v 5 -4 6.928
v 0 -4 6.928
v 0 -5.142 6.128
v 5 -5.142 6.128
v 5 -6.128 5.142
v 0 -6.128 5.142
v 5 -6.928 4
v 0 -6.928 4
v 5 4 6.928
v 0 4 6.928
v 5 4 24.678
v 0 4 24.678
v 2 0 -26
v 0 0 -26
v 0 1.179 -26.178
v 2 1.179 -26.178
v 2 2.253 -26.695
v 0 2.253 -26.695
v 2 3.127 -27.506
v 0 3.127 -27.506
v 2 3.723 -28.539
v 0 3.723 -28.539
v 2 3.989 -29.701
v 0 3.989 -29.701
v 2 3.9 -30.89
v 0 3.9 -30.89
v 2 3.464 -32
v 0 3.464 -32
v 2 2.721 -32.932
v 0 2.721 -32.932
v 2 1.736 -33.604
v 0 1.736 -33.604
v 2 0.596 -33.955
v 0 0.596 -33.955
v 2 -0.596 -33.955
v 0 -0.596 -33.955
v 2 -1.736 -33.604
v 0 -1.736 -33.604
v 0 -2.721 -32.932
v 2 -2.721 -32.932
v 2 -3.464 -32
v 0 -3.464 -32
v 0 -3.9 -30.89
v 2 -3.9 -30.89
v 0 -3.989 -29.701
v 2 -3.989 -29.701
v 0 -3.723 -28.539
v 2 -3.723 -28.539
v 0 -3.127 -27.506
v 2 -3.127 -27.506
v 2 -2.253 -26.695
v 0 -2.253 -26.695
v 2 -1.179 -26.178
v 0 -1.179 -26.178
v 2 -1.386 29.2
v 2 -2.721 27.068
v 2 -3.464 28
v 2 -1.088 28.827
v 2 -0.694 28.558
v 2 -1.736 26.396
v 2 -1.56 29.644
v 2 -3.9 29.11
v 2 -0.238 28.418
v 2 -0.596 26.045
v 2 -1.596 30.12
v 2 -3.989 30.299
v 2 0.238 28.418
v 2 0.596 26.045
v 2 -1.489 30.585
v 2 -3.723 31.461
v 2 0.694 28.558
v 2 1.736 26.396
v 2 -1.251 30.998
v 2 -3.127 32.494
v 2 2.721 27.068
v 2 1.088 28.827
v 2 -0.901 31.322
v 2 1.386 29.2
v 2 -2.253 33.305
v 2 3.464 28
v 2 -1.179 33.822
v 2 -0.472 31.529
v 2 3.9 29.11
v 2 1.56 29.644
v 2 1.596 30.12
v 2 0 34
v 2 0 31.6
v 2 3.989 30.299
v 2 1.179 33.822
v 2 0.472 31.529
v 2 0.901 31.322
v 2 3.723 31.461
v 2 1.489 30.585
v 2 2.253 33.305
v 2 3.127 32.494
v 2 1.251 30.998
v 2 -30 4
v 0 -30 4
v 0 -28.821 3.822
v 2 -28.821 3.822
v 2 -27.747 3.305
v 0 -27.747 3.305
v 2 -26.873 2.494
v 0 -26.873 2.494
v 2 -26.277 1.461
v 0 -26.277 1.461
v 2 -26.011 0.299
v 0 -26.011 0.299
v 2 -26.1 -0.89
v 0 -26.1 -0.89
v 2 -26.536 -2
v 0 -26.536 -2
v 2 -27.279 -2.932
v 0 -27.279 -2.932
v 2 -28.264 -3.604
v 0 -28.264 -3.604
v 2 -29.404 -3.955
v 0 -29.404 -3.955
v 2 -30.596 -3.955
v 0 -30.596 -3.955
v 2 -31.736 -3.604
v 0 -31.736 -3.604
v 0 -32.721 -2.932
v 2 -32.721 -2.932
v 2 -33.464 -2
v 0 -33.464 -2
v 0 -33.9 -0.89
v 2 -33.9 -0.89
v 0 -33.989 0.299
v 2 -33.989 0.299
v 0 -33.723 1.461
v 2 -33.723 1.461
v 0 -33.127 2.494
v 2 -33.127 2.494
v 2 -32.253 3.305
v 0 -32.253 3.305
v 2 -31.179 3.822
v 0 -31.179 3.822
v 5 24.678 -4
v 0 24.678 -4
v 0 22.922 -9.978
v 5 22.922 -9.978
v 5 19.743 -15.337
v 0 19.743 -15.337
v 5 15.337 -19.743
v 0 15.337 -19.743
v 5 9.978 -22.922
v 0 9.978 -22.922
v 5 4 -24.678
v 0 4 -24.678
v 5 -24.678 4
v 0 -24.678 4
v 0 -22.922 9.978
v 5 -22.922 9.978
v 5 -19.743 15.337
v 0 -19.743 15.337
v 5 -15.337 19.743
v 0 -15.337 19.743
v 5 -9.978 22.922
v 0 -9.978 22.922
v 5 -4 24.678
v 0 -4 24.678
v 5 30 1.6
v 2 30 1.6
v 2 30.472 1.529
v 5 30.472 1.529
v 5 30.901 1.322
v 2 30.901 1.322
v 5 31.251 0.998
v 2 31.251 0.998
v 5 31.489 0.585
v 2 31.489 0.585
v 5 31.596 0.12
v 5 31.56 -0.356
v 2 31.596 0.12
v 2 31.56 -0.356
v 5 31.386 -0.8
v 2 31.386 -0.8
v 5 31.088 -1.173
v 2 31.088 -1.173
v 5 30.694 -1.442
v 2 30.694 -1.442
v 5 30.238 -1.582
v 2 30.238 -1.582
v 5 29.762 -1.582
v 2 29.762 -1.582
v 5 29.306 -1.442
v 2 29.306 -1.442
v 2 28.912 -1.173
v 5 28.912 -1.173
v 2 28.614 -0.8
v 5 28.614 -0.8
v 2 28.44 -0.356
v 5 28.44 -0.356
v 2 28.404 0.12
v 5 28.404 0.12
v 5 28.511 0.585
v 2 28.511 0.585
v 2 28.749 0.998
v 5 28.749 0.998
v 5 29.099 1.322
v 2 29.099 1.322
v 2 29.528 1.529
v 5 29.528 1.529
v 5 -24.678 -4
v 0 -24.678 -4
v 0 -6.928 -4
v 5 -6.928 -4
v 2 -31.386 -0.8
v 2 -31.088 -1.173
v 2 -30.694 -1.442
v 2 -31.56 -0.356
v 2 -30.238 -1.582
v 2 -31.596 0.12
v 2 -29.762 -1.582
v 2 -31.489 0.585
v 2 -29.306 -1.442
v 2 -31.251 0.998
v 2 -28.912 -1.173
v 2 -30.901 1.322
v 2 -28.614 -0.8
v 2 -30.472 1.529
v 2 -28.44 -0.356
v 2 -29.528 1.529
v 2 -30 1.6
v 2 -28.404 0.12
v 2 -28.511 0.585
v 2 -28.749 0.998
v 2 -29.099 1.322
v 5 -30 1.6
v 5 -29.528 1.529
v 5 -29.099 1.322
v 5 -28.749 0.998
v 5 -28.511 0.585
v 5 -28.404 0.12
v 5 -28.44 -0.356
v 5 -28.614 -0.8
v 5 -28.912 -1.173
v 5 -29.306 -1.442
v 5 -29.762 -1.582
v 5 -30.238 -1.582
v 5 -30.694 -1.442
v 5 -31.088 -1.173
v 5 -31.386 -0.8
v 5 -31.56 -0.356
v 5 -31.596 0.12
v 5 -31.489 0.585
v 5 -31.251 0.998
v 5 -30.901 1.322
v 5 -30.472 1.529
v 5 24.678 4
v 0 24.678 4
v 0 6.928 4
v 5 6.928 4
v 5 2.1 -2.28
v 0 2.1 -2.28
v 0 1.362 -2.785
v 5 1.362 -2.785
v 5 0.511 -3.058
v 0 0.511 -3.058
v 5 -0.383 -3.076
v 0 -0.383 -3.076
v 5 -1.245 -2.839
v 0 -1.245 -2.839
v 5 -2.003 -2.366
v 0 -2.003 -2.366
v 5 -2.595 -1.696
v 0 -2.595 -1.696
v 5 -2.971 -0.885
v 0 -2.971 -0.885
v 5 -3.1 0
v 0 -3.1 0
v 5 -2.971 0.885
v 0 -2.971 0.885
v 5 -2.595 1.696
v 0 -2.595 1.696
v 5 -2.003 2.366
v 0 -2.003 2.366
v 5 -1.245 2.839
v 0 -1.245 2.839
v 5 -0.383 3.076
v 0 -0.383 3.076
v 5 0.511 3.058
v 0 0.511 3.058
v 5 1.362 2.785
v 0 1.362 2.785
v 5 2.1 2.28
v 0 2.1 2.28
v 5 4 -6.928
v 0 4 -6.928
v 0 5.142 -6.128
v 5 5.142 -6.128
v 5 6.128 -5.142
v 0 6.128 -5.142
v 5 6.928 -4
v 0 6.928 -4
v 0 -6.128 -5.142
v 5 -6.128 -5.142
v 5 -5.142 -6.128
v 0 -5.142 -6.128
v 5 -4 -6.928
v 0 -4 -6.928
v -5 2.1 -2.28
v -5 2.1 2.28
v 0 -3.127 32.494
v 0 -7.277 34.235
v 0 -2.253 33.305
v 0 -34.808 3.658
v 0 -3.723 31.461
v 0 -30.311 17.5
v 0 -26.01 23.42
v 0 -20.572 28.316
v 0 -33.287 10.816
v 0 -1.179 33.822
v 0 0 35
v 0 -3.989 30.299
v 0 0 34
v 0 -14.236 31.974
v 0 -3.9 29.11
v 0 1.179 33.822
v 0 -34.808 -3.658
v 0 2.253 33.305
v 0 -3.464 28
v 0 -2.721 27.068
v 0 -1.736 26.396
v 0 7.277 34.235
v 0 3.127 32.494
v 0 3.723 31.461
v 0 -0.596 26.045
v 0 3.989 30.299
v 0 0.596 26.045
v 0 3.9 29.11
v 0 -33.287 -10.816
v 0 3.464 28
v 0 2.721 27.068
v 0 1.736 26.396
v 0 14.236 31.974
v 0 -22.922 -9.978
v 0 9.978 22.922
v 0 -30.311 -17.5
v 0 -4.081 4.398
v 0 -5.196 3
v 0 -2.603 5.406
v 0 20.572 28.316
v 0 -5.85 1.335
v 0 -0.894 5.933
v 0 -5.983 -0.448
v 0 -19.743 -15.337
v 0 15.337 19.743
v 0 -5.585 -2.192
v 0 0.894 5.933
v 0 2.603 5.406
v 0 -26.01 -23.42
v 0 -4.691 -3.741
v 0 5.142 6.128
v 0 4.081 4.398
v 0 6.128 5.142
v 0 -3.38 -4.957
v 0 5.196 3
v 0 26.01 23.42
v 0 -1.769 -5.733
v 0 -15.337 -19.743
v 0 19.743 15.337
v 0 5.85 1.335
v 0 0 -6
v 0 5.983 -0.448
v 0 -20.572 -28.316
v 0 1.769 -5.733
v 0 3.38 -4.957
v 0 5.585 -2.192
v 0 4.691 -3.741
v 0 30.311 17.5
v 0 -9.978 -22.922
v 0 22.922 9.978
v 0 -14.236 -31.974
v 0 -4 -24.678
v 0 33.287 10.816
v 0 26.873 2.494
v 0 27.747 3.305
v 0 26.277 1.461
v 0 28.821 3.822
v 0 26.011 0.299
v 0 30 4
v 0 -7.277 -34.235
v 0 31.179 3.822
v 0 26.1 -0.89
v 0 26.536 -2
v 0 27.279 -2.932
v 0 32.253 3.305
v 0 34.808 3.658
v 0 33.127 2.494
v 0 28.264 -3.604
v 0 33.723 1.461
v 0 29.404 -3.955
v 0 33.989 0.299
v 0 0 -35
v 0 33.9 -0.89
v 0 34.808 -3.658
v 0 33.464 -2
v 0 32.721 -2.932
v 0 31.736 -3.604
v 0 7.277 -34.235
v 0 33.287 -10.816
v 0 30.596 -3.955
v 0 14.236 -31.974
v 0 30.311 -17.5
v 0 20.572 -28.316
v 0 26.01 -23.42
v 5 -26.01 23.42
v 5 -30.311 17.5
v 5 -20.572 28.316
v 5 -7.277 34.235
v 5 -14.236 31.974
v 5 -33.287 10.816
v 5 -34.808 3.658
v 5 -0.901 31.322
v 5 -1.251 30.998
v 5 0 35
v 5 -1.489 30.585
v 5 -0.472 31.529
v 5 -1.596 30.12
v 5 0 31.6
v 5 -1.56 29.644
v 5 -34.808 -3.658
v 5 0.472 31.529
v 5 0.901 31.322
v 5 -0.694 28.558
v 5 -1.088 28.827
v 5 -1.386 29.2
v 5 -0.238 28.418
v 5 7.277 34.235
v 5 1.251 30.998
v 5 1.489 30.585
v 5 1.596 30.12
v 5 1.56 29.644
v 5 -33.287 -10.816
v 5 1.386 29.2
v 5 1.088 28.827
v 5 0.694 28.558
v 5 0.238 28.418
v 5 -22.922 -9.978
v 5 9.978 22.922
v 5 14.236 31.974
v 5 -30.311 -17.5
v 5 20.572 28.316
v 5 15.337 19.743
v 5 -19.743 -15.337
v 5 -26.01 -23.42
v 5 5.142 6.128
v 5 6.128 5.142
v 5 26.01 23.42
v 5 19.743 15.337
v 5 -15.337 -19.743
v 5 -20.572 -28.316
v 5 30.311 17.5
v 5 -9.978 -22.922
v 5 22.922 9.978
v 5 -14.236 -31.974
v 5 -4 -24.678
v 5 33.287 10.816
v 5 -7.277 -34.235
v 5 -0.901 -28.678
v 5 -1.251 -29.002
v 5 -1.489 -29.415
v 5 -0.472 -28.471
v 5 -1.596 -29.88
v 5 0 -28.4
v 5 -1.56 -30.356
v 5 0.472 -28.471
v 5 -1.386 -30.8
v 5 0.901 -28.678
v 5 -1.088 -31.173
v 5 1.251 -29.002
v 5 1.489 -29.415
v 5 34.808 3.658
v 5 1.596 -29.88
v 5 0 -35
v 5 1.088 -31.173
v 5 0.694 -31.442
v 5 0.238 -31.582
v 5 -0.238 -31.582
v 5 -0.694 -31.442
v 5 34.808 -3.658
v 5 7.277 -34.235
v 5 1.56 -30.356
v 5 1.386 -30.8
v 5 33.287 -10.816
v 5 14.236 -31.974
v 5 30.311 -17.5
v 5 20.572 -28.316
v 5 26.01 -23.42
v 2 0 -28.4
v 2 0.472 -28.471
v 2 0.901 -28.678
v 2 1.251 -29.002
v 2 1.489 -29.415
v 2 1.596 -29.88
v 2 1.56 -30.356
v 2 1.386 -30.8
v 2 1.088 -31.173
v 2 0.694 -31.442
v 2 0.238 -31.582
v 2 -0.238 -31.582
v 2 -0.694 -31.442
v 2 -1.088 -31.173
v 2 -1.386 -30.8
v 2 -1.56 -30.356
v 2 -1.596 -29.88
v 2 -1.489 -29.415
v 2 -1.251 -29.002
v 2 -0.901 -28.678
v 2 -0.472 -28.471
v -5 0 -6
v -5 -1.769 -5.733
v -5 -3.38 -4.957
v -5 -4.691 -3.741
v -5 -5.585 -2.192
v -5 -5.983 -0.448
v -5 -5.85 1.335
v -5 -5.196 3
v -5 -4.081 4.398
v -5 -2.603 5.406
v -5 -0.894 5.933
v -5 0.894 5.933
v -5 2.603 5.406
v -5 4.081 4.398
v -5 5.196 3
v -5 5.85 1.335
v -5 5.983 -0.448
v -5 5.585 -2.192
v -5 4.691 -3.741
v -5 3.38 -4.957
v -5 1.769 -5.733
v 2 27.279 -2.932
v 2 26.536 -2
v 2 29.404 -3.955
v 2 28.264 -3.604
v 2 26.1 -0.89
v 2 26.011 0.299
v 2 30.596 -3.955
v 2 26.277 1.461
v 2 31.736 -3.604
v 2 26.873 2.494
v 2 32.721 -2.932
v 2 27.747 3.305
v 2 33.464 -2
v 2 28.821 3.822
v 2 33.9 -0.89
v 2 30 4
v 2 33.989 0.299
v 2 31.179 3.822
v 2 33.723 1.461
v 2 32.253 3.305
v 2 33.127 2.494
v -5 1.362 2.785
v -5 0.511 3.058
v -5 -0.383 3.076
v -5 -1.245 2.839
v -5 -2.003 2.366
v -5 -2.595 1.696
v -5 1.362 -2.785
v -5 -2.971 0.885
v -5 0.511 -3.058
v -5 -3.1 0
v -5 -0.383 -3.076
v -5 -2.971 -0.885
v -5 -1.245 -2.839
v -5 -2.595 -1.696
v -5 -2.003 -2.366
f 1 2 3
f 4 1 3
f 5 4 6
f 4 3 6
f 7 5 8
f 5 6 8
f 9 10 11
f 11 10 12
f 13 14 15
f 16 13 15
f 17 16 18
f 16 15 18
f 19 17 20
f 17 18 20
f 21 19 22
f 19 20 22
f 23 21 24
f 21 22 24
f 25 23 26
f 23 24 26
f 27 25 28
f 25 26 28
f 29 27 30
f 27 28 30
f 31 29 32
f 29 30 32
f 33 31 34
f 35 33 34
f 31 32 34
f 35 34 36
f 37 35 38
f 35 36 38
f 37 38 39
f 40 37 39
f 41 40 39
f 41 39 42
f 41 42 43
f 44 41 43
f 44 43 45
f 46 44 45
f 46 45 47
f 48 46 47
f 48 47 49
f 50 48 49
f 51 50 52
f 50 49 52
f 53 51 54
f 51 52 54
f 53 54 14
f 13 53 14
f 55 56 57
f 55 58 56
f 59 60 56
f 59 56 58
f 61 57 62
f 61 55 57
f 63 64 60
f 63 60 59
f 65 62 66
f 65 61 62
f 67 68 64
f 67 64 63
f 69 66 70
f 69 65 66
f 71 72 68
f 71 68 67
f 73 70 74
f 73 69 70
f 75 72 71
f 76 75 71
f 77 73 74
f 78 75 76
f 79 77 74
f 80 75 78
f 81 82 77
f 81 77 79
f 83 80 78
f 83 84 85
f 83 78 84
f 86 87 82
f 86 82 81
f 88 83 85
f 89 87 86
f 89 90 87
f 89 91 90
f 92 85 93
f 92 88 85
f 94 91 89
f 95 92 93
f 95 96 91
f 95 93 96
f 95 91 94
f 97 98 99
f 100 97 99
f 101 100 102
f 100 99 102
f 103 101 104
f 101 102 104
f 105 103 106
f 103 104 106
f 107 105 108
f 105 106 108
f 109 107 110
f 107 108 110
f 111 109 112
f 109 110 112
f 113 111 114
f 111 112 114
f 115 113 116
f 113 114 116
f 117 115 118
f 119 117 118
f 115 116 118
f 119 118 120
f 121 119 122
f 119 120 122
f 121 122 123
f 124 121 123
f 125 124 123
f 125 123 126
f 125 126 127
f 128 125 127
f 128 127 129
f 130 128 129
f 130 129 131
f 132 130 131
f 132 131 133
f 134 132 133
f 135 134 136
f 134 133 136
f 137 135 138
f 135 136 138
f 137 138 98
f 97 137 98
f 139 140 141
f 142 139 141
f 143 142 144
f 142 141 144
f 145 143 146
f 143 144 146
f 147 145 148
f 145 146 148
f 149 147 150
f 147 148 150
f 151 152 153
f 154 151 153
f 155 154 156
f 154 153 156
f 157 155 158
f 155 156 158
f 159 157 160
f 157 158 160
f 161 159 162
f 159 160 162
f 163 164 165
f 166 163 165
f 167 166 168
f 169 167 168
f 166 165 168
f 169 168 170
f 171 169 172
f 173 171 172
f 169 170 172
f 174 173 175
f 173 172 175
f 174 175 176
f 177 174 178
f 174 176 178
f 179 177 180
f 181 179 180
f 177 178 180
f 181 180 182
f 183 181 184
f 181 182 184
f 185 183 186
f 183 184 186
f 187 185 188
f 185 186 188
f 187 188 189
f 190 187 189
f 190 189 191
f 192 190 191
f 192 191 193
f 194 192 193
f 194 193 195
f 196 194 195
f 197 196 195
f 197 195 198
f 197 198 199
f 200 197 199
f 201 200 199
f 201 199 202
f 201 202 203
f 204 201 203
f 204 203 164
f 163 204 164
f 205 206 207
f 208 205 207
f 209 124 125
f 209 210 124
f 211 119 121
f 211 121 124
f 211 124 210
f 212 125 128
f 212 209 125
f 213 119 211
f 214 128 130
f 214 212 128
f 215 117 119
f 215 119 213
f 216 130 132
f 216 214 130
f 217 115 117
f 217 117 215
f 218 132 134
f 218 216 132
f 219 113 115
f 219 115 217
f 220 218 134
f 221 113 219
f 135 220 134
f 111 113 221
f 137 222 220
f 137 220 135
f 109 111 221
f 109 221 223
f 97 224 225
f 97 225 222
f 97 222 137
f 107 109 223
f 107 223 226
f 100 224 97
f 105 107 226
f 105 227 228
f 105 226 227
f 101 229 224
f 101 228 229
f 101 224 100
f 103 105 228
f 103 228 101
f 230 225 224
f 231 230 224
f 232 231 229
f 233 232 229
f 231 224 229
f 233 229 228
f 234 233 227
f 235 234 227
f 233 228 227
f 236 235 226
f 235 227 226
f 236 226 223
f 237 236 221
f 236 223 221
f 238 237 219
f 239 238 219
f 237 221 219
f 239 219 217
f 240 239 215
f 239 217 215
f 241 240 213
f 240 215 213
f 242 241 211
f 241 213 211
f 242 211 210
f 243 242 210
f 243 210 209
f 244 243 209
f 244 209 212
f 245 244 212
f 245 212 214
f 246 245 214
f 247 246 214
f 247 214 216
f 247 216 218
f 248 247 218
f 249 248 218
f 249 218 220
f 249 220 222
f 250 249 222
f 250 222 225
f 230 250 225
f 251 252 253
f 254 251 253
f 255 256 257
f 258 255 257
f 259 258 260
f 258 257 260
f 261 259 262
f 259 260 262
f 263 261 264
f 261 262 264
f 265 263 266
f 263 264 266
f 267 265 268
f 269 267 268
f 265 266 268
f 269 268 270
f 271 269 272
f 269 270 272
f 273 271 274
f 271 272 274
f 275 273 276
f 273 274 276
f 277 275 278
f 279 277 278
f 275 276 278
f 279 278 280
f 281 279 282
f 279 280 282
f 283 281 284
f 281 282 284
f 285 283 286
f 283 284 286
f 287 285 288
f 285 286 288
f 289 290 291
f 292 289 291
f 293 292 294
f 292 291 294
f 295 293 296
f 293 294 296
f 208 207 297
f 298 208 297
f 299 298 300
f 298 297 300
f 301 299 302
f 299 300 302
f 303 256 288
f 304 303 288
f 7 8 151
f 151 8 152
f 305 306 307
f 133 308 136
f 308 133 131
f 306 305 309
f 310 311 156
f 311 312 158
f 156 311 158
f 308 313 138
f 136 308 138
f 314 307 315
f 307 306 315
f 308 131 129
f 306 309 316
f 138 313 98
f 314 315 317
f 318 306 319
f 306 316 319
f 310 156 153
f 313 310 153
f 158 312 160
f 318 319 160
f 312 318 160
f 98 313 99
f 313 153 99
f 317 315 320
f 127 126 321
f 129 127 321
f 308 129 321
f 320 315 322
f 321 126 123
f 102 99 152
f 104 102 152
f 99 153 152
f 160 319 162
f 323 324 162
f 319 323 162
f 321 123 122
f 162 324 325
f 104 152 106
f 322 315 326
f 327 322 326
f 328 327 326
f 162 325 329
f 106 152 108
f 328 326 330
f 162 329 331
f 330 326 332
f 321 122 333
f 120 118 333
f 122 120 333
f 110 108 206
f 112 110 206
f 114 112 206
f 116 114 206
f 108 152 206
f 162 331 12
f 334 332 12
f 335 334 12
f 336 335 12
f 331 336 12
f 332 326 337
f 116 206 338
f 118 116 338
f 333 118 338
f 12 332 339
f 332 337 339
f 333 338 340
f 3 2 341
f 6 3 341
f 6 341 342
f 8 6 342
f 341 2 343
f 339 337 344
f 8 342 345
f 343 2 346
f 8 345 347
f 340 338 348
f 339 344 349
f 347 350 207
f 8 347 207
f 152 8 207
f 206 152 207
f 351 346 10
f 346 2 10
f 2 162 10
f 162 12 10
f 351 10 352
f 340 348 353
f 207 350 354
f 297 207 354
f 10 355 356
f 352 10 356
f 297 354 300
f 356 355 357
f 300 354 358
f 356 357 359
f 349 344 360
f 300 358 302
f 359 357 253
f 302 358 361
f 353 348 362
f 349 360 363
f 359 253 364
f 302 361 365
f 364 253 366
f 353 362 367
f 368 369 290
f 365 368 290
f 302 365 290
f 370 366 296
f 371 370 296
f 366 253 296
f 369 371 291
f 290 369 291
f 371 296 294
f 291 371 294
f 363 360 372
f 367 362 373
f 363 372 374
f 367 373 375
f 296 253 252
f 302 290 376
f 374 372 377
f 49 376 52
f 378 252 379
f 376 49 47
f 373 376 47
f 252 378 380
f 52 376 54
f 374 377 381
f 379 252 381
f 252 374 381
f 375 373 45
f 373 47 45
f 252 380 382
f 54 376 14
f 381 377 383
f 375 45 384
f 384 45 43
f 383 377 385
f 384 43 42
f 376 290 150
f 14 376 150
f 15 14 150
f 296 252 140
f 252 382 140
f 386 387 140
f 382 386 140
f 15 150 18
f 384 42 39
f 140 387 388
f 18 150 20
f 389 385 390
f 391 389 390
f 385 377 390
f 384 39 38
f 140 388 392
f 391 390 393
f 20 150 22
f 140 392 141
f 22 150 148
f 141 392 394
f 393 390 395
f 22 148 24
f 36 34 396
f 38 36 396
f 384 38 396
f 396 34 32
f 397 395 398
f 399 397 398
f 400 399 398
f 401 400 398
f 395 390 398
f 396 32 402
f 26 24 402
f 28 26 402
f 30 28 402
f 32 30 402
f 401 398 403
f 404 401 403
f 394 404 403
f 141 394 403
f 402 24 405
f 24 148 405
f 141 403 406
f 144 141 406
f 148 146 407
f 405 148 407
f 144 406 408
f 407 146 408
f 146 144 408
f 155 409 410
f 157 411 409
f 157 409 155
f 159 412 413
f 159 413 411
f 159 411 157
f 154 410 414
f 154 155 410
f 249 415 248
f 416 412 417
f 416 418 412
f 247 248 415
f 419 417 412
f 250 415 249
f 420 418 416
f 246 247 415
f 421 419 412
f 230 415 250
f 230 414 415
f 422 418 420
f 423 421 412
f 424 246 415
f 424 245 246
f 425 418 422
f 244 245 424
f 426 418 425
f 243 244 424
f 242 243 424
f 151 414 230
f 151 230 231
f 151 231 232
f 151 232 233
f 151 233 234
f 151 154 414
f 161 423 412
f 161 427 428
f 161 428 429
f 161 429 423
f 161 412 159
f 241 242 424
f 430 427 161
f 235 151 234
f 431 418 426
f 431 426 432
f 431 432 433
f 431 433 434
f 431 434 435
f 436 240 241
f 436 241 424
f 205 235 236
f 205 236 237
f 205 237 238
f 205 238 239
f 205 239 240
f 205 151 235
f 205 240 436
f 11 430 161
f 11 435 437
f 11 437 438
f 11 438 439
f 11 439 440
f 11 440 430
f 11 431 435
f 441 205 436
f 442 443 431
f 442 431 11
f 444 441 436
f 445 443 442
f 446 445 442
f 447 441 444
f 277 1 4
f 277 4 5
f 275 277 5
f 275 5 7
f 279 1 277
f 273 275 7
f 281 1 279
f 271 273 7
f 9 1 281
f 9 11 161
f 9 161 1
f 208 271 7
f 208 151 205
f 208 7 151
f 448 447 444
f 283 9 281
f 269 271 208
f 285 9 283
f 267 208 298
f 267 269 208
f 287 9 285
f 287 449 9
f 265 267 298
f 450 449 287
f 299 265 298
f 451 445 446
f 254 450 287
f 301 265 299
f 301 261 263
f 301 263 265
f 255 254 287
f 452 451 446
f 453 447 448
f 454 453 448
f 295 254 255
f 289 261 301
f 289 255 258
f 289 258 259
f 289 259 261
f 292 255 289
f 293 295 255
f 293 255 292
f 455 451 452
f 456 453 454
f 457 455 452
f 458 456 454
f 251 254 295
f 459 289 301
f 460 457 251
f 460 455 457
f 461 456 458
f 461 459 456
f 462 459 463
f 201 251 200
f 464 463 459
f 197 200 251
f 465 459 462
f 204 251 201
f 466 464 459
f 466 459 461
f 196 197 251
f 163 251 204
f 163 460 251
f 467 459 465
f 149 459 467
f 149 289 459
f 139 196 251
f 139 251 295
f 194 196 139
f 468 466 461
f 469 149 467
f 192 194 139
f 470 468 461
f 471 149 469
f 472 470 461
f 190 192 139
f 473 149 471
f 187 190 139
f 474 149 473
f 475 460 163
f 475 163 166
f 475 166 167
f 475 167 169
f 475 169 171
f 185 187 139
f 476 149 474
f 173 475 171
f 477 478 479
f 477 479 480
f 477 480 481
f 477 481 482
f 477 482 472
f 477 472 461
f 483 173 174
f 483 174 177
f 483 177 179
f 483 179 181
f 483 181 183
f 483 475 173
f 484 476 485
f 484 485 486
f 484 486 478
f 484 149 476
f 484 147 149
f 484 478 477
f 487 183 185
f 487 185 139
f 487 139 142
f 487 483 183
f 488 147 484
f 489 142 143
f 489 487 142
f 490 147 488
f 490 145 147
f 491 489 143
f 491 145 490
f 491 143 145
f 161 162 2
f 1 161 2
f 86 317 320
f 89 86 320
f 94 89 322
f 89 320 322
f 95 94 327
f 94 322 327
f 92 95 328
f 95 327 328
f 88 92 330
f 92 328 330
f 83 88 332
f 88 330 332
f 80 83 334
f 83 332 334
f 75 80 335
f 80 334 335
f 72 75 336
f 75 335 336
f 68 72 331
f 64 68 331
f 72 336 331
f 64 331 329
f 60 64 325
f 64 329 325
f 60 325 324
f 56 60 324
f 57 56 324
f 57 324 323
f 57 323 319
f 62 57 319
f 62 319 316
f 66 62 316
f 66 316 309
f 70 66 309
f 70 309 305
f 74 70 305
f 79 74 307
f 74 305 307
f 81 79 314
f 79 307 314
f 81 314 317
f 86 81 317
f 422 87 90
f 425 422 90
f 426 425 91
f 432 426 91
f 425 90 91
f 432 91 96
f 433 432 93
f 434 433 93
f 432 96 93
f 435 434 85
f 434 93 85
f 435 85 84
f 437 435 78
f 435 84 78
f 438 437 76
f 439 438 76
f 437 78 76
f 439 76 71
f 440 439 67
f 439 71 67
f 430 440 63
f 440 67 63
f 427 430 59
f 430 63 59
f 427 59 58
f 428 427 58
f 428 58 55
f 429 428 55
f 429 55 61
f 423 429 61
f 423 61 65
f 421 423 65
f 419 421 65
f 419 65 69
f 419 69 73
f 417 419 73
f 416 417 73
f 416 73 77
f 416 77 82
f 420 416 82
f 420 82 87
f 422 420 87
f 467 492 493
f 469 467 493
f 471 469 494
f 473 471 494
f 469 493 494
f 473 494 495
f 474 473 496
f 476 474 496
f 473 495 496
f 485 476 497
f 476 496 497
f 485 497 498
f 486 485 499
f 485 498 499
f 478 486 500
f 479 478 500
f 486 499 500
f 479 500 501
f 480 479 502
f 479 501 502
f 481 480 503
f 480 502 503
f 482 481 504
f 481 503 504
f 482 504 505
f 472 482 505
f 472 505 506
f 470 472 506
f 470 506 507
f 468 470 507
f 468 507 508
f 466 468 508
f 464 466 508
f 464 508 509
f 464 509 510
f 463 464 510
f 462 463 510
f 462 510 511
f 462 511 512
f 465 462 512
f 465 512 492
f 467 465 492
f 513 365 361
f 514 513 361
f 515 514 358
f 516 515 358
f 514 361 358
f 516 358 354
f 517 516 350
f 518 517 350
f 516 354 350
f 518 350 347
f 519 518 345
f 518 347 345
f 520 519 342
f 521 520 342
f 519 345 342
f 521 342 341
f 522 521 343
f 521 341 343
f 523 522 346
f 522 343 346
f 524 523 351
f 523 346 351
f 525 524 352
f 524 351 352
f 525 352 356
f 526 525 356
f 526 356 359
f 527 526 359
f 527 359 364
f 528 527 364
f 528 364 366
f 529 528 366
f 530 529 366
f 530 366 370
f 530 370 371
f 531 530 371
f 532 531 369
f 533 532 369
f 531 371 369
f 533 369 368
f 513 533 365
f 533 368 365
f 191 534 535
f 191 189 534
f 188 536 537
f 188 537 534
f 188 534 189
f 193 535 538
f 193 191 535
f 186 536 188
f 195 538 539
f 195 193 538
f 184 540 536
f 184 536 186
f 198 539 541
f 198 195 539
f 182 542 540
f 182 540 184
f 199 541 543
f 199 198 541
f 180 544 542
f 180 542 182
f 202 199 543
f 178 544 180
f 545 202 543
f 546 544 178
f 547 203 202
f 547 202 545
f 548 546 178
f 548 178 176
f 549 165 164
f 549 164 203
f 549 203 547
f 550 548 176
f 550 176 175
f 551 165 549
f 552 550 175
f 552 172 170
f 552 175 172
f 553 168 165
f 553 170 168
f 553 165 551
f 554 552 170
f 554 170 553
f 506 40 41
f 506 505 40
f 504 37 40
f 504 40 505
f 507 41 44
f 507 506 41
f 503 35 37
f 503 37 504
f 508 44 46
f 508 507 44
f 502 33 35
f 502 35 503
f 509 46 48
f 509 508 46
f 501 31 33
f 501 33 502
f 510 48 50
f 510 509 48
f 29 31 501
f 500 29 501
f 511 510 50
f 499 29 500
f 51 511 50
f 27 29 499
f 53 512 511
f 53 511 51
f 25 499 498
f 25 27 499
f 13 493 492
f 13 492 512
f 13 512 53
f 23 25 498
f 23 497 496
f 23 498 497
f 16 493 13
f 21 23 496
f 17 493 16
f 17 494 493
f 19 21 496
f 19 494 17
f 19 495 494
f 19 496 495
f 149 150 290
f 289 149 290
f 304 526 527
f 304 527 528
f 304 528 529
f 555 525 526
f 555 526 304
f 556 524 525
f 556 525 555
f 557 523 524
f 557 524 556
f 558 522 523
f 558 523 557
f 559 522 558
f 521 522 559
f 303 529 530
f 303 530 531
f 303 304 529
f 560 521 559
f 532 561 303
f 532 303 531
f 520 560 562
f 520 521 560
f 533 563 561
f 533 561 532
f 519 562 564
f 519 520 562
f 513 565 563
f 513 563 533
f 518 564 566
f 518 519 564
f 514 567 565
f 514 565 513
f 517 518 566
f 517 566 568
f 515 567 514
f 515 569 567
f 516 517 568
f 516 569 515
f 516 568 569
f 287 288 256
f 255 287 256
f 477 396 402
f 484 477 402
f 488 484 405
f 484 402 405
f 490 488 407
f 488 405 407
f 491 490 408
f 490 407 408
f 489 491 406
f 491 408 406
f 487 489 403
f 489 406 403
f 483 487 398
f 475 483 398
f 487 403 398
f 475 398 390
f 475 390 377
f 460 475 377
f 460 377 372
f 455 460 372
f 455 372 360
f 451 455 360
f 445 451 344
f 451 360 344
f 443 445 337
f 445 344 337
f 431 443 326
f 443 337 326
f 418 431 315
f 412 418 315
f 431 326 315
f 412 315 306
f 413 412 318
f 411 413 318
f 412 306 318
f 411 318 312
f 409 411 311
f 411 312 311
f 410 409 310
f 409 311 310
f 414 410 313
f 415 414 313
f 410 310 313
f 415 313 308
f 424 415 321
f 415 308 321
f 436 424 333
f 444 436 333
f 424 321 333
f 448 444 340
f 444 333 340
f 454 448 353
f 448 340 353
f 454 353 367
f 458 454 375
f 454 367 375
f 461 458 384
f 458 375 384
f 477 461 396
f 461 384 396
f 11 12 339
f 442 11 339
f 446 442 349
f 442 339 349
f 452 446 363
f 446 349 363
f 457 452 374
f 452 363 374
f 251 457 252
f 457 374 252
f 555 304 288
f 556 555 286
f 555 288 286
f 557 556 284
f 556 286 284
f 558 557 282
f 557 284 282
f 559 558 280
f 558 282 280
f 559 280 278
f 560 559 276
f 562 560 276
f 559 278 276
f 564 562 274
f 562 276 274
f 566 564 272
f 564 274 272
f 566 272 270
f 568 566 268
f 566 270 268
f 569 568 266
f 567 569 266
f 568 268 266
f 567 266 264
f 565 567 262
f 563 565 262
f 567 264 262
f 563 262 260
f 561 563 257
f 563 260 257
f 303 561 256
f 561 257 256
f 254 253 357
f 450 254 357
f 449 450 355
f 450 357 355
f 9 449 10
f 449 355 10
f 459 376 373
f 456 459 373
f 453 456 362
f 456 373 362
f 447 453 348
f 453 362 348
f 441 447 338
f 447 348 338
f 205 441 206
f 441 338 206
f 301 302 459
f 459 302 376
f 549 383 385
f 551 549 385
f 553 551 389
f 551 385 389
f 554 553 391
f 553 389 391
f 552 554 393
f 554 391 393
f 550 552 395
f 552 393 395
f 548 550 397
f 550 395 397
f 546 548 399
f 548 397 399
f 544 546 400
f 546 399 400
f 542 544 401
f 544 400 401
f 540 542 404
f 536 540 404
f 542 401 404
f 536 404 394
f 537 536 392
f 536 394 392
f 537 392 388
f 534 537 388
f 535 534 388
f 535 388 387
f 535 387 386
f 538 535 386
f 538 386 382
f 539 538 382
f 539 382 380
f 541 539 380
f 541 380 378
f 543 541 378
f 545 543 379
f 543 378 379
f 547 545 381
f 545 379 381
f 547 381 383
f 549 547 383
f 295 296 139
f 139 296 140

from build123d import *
from build123d.topology import SkipClean

# Parameters (mm, degrees)
SKETCH1_R           = 35
BOSS_EXTRUDE1_DEPTH = 5
SKETCH2_R           = 1.6
CUT_EXTRUDE1_DEPTH  = 50.749371855
SKETCH3_R           = 6
BOSS_EXTRUDE2_DEPTH = 5
SKETCH6_R           = 4
CUT_EXTRUDE2_DEPTH  = 2


with BuildPart() as part:
    # Sketch1 → Boss-Extrude1 (new body)
    with BuildSketch(Plane(origin=(0, 0, 0), x_dir=(0, 0, -1), z_dir=(1, 0, 0))):
        Circle(SKETCH1_R)
        with BuildLine():
            Line((4, 6.92820323), (4, 24.677925359))
            ThreePointArc((4, 24.677925359), (17.67766953, 17.67766953), (24.677925359, 4))
            Line((24.677925359, 4), (6.92820323, 4))
            ThreePointArc((6.92820323, 4), (5.656854249, 5.656854249), (4, 6.92820323))
        make_face(mode=Mode.SUBTRACT)
        with BuildLine():
            Line((-4, 24.677925359), (-4, 6.92820323))
            ThreePointArc((-4, 6.92820323), (-5.656854249, 5.656854249), (-6.92820323, 4))
            Line((-6.92820323, 4), (-24.677925359, 4))
            ThreePointArc((-24.677925359, 4), (-17.67766953, 17.67766953), (-4, 24.677925359))
        make_face(mode=Mode.SUBTRACT)
        with BuildLine():
            Line((-24.677925359, -4), (-6.92820323, -4))
            ThreePointArc((-6.92820323, -4), (-5.656854249, -5.656854249), (-4, -6.92820323))
            Line((-4, -6.92820323), (-4, -24.677925359))
            ThreePointArc((-4, -24.677925359), (-17.67766953, -17.67766953), (-24.677925359, -4))
        make_face(mode=Mode.SUBTRACT)
        with BuildLine():
            Line((4, -24.677925359), (4, -6.92820323))
            ThreePointArc((4, -6.92820323), (5.656854249, -5.656854249), (6.92820323, -4))
            Line((6.92820323, -4), (24.677925359, -4))
            ThreePointArc((24.677925359, -4), (17.67766953, -17.67766953), (4, -24.677925359))
        make_face(mode=Mode.SUBTRACT)
        with BuildLine():
            Line((-2.28035085, 2.1), (2.28035085, 2.1))
            ThreePointArc((2.28035085, 2.1), (0, -3.1), (-2.28035085, 2.1))
        make_face(mode=Mode.SUBTRACT)
    extrude(amount=BOSS_EXTRUDE1_DEPTH)

    # Sketch2 → Cut-Extrude1 (cut, through all)
    with BuildSketch(Plane.ZY):
        with Locations((0, 30)):
            Circle(SKETCH2_R)
        with Locations((30, 0)):
            Circle(SKETCH2_R)
        with Locations((0, -30)):
            Circle(SKETCH2_R)
        with Locations((-30, 0)):
            Circle(SKETCH2_R)
    extrude(amount=-CUT_EXTRUDE1_DEPTH, mode=Mode.SUBTRACT)

    # Sketch3 → Boss-Extrude2 (add)
    with SkipClean():  # the faces are left unmerged after this step: merging them gives an invalid solid
        with BuildSketch(Plane.ZY):
            with Locations(Location((0, 0, 0), (0, 0, 180))):
                Circle(SKETCH3_R)
            with BuildLine():
                Line((-2.28035085, 2.1), (2.28035085, 2.1))
                ThreePointArc((2.28035085, 2.1), (0, -3.1), (-2.28035085, 2.1))
            make_face(mode=Mode.SUBTRACT)
        extrude(amount=BOSS_EXTRUDE2_DEPTH)

    # Sketch6 → Cut-Extrude2 (cut)
    with SkipClean():  # the faces are left unmerged after this step: merging them gives an invalid solid
        with BuildSketch(Plane.ZY):
            with Locations((0, 30)):
                Circle(SKETCH6_R)
            with Locations((30, 0)):
                Circle(SKETCH6_R)
            with Locations((0, -30)):
                Circle(SKETCH6_R)
            with Locations((-30, 0)):
                Circle(SKETCH6_R)
        extrude(amount=-CUT_EXTRUDE2_DEPTH, mode=Mode.SUBTRACT)


solid = part.part
